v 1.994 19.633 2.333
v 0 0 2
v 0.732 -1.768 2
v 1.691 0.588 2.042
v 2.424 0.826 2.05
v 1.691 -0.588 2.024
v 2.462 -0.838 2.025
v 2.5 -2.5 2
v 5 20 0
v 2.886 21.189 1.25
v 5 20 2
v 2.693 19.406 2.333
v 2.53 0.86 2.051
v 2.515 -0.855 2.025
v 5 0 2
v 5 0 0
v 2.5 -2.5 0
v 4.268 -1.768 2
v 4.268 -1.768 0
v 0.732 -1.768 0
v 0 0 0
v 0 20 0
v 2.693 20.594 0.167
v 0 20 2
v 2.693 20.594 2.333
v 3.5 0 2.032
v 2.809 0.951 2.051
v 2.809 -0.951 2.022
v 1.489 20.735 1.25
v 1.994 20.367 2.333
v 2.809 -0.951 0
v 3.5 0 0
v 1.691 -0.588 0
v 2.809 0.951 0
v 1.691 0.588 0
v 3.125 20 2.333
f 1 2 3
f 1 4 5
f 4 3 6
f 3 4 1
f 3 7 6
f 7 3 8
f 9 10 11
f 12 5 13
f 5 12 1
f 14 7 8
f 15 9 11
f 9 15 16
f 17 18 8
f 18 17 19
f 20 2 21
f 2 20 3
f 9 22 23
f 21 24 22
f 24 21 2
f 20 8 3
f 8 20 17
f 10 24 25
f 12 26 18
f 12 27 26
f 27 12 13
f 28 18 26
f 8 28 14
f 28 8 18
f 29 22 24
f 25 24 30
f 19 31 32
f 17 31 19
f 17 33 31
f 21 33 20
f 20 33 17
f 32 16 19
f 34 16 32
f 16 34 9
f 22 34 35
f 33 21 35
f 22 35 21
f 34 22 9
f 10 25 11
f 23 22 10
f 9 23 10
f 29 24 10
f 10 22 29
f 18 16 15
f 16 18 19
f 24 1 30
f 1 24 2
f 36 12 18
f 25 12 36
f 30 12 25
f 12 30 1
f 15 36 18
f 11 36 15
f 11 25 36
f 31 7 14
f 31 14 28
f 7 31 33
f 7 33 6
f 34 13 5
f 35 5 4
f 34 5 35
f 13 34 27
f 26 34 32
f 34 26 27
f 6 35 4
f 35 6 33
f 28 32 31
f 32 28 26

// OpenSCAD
// file: variables.scad
// General
DIFFERENCE_FIX = 0.1;
DIFFERENCE_FIX_NEGATIVE = -1 * DIFFERENCE_FIX;
DIFFERENCE_FIX_2 = 2 * DIFFERENCE_FIX;

componentThickness = 5;
screwHoleRadius = 1;
screwHoleDepth = 20;

// Servo cutout
servoWidth = 12;
servoHeight = 23.5;
servoOffsetTop = 6;
servoFlangeDistance = 12.5;

// Servo mounting plate
servoPlateRadius = 10;
servoPlateThickness = 1.6;

// Support
supportThickness = 8;
supportHoleHeight = 50;
supportWidth = 50;
supportTaper = 12;
supportBaseDepth = 15;
supportMountingHoleRadius = 2;

// Support right
supportRightHoleRadius = 3;

// Camera mount
cameraMountGoproWidth = 63;
cameraMountGoproHeight = 45;
cameraMountGoproDepth = 25;

cameraMountThickness = componentThickness;
cameraMountWidth = cameraMountGoproWidth + 2 * cameraMountThickness;
cameraMountHeight = cameraMountGoproHeight + 2 * cameraMountThickness;
cameraMountDepth = cameraMountGoproDepth + cameraMountThickness;

cameraMountShutterCutoutWidth = 13;
cameraMountShutterCutoutOffsetX = 8;
cameraMountShutterCutoutOffsetZ = 6;
cameraMountShutterCutoutGap = componentThickness;

cameraMountPowerCutoutDepth = 10;
cameraMountPowerCutoutHeight = 9;
cameraMountPowerCutoutOffsetY = 9;
cameraMountPowerCutoutOffsetZ = 7;
cameraMountPowerCutoutGap = componentThickness;

cameraMountBackCutoutOffset = 8;

cameraMountPinOffsetRadius = supportRightHoleRadius + 2;
cameraMountPinOffsetHeight = 2;
cameraMountPinRadiusOffset = 0.1;

cameraMountScrewHoleRadius = screwHoleRadius;
cameraMountScrewHoleDepth = screwHoleDepth;

// Frame
framePinOffsetRadius = cameraMountPinOffsetRadius;
framePinOffsetHeight = cameraMountPinOffsetHeight;
framePinRadiusOffset = cameraMountPinRadiusOffset;

frameCameraMountOffsetX = 10;
frameThickness = componentThickness;
frameWidth = cameraMountWidth + 2 * frameThickness + 2 * frameCameraMountOffsetX;
frameHeight = cameraMountHeight + 2 * frameThickness + servoFlangeDistance + framePinOffsetHeight + 1;
frameDepth = 22;
frameHoleTopRadius = supportRightHoleRadius;

frameShutterCutoutWidth = 25;
frameShutterCutoutHeight = 18;
frameShutterCutoutOffsetX = 22;

frameScrewHoleHeight = screwHoleDepth;
frameScrewHoleRadius = screwHoleRadius;
frameScrewHoleOffsetZ = 3;

// Lock
lockHeight = 20;
lockThickness = 2;
lockWidth = frameThickness;
// main file
include <variables.scad>

// Lock for camera
module lock() {
    difference() {
        hull() {
            // Top round
            translate([lockWidth / 2, 0, 0])
            cylinder(r = lockWidth / 2, h = lockThickness);

            // Standoff
            translate([lockWidth / 2, lockHeight, lockWidth / 4])
            sphere(r = lockWidth / 4);

            // Body
            cube([lockWidth, lockHeight, lockThickness]);
        }

        // Screw hole
        translate([lockWidth / 2, 0, 0])
        cylinder(r = cameraMountScrewHoleRadius, h = lockThickness * 2);
    }
}

lock();
